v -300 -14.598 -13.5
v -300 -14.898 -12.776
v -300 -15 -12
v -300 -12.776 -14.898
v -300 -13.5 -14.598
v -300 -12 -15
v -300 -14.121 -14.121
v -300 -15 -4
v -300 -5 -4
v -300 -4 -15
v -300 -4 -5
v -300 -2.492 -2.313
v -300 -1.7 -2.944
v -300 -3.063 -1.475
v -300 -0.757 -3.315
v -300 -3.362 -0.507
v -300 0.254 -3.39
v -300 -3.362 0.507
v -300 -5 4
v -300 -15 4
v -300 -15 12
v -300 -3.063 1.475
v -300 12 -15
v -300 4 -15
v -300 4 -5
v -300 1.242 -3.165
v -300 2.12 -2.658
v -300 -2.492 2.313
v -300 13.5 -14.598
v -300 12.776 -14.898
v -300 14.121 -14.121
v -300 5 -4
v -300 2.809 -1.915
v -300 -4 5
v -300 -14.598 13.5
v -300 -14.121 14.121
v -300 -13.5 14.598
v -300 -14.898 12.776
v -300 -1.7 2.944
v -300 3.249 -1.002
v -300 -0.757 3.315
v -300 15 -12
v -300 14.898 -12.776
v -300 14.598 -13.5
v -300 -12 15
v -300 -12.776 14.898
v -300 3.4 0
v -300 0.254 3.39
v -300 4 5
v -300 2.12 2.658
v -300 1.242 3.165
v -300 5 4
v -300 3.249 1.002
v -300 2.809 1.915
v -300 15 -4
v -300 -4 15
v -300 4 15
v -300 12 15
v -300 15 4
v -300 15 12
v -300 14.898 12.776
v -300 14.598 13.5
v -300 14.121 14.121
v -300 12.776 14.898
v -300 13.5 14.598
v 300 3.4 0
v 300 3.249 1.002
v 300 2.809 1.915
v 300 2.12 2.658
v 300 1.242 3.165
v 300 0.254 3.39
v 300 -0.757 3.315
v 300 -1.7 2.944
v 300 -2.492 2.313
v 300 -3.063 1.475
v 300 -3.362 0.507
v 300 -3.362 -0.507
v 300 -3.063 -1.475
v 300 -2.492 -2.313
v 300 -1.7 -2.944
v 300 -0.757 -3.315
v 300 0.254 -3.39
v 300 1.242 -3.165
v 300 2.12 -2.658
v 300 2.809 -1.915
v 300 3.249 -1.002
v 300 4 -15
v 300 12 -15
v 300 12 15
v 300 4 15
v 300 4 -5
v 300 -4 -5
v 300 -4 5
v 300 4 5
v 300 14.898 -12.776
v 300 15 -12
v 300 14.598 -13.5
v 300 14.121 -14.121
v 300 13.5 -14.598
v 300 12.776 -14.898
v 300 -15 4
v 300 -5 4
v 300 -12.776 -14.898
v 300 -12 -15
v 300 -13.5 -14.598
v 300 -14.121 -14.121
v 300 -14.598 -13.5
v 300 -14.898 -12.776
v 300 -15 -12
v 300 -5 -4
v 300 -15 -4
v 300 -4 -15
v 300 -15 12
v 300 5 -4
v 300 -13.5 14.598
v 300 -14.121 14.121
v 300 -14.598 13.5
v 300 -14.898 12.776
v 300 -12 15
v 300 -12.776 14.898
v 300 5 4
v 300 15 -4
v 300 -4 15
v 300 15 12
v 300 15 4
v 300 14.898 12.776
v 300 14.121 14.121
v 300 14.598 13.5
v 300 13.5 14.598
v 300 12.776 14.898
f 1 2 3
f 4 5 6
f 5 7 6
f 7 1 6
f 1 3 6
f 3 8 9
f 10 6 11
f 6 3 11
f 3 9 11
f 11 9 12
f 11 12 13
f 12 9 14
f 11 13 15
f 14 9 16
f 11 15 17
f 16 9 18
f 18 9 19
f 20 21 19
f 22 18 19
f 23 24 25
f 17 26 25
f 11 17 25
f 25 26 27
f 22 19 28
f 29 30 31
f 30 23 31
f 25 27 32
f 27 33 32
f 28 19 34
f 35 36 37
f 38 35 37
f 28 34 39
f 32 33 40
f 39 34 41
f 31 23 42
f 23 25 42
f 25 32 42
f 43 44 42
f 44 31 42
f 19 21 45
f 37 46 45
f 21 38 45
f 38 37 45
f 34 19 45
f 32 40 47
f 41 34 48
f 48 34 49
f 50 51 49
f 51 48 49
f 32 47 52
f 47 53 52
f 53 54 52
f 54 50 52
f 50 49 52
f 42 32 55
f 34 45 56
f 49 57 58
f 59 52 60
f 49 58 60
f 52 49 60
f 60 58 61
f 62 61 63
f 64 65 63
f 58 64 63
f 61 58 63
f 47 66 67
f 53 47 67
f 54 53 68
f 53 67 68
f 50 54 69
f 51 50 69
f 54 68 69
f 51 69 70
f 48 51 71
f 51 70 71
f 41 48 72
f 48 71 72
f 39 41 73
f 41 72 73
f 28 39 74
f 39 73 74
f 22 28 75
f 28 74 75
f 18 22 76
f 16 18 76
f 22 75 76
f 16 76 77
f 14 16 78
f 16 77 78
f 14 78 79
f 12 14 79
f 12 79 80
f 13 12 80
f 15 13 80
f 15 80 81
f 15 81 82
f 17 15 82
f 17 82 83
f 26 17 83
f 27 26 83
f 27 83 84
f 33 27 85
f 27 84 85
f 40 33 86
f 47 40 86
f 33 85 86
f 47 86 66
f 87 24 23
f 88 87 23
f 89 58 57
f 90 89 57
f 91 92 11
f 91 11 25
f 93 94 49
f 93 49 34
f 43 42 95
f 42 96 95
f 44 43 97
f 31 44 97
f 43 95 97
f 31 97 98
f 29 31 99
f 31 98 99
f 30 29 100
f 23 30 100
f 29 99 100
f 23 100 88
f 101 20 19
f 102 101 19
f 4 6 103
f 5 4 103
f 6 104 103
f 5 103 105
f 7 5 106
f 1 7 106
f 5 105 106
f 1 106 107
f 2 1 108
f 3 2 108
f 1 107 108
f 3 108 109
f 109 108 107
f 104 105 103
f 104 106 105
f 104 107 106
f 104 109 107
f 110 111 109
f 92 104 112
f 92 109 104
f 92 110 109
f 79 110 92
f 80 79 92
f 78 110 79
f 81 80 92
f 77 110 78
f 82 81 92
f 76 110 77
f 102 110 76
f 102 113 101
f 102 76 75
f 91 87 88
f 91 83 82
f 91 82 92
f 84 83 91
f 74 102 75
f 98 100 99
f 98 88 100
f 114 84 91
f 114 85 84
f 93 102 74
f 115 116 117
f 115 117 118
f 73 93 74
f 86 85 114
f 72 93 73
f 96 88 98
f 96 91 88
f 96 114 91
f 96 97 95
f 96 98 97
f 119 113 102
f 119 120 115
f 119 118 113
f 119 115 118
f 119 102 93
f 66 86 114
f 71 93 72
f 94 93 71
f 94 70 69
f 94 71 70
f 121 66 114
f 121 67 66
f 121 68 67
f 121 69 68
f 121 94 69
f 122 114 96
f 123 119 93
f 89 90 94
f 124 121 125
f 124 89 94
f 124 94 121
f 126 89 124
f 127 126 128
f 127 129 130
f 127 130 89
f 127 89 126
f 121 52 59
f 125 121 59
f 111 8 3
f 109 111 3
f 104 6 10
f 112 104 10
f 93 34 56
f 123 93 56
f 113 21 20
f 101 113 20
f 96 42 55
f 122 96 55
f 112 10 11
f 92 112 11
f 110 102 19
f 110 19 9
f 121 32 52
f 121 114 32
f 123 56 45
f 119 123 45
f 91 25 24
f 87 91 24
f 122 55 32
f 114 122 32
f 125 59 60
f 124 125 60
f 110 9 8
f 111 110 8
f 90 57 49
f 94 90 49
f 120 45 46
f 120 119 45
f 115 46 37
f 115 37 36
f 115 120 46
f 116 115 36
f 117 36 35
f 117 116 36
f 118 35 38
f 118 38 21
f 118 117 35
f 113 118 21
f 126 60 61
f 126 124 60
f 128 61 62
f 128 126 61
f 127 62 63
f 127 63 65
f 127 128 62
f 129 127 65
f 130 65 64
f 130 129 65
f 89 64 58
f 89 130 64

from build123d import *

# Parameters (mm, degrees)
F1_DEPTH = 300
F2_R     = 3.4
F3_DEPTH = 600
F4_R     = 3


with BuildPart() as f1:
    # F0 (on Right) → F1 (new body, symmetric)
    with BuildSketch(Plane.YZ):
        Polygon((15, 4), (15, 15), (4, 15), (4, 5), (-4, 5), (-4, 15), (-15, 15), (-15, 4), (-5, 4), (-5, -4), (-15, -4), (-15, -15), (-4, -15), (-4, -5), (4, -5), (4, -15), (15, -15), (15, -4), (5, -4), (5, 4), align=None)
    extrude(amount=F1_DEPTH, both=True)

    # F2 (on face) → F3 (cut)
    with BuildSketch(Plane.YZ.offset(300)):
        Circle(F2_R)
    extrude(amount=-F3_DEPTH, mode=Mode.SUBTRACT)

    # F4
    f4_edges = [f1.edges().sort_by_distance(p)[0] for p in [
        (0, 15, -15),
        (0, 15, 15),
        (0, -15, -15),
        (0, -15, 15),
    ]]
    fillet(f4_edges, radius=F4_R)


solid = f1.part
